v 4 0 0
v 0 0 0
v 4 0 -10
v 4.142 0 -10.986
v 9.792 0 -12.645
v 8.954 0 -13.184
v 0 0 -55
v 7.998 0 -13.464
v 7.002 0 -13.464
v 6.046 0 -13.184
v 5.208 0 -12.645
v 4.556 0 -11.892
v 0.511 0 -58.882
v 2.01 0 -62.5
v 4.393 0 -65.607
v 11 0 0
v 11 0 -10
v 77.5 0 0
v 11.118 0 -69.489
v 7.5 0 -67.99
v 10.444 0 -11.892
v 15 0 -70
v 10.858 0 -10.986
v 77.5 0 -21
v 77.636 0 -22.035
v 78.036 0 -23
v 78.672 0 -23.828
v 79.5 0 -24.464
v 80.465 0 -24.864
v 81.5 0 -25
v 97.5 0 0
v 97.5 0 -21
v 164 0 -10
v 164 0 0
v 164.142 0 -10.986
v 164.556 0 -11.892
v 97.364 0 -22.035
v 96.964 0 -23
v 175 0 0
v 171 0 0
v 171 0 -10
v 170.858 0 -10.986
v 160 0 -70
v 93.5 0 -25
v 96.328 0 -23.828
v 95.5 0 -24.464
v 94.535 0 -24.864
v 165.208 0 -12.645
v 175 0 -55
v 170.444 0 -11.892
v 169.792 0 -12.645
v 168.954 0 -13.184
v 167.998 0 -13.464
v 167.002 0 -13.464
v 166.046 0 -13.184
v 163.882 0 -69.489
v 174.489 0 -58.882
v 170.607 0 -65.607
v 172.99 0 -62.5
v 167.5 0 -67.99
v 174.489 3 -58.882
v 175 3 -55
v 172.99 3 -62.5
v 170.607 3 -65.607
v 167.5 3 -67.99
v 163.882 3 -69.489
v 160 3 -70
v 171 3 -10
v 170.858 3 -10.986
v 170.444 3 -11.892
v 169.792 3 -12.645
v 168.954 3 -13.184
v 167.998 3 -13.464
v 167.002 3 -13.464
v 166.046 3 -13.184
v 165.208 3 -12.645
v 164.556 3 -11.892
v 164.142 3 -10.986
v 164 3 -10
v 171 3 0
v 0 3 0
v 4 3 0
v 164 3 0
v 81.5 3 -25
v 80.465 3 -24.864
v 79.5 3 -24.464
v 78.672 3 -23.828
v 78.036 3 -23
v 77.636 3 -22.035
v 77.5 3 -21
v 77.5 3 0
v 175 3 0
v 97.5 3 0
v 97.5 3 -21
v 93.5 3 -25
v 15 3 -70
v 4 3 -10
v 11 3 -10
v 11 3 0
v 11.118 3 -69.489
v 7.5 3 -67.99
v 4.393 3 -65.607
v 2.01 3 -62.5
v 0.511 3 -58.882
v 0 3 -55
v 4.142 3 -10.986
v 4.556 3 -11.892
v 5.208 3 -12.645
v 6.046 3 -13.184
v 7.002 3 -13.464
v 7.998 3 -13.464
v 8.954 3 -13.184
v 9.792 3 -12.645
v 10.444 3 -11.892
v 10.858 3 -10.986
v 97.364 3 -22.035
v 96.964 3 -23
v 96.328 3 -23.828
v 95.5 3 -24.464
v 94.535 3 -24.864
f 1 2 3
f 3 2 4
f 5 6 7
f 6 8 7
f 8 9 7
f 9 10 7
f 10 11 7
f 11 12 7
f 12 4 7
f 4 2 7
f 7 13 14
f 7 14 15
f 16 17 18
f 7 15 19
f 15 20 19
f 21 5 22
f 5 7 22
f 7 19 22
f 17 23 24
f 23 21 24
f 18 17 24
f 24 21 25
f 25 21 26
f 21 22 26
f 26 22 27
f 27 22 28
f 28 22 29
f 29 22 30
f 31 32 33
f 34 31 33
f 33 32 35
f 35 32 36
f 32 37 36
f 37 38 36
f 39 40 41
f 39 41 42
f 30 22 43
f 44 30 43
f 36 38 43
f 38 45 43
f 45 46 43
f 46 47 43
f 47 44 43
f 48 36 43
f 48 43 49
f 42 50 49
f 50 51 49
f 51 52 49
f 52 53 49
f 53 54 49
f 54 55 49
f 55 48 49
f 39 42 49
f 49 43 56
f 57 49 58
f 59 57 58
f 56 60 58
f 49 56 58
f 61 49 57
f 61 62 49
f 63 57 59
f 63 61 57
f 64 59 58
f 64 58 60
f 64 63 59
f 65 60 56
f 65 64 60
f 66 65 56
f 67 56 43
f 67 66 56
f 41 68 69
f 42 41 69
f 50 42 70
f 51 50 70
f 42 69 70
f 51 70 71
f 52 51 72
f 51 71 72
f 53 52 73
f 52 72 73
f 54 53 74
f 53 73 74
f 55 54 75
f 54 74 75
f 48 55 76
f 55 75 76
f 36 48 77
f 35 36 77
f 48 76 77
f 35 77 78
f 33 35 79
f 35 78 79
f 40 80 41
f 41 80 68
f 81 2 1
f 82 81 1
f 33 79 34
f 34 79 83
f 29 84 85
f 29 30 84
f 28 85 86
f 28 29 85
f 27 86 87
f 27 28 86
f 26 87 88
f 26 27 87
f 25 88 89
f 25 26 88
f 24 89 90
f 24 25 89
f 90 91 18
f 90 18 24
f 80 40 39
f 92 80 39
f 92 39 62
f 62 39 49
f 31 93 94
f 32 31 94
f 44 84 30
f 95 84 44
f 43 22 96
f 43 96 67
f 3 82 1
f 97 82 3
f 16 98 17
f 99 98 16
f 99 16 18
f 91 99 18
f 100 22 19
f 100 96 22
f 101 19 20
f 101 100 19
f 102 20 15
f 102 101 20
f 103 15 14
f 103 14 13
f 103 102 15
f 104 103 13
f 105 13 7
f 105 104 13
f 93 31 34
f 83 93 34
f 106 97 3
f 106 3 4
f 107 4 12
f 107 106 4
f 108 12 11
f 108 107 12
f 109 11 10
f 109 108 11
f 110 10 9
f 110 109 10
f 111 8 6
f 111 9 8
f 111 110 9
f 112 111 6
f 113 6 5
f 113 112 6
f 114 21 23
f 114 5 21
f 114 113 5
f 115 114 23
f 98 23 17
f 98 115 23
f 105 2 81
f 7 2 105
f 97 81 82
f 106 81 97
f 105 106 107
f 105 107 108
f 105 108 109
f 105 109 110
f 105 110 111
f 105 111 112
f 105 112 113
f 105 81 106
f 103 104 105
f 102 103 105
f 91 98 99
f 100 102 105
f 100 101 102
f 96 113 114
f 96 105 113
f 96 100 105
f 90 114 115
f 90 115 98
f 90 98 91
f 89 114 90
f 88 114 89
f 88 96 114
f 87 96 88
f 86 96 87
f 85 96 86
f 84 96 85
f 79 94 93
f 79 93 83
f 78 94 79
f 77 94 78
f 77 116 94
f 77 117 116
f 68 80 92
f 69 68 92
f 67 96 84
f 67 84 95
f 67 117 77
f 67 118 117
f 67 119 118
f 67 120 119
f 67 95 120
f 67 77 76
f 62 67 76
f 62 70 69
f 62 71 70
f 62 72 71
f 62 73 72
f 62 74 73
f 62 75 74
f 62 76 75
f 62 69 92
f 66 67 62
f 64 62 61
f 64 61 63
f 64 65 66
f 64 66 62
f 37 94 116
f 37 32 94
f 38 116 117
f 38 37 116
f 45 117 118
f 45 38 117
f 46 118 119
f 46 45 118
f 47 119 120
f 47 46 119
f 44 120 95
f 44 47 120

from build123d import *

# Parameters (mm, degrees)
SKETCH1_W           = 175
SKETCH1_H           = 70
BOSS_EXTRUDE1_DEPTH = 3
SKETCH2_W           = 20
SKETCH2_H           = 25
CUT_EXTRUDE1_DEPTH  = 5
FILLET1_R           = 4
FILLET2_R           = 15


with BuildPart() as part:
    # Sketch1 → Boss-Extrude1 (new body)
    with BuildSketch(Plane(origin=(0, 0, 0), x_dir=(1, 0, 0), z_dir=(0, 1, 0))):
        with Locations((87.5, 35)):
            Rectangle(SKETCH1_W, SKETCH1_H)
    extrude(amount=BOSS_EXTRUDE1_DEPTH)

    # Sketch2 → Cut-Extrude1 (cut)
    with BuildSketch(Plane(origin=(0, 3, 0), x_dir=(1, 0, 0), z_dir=(0, 1, 0))):
        with Locations((87.5, 12.5)):
            Rectangle(SKETCH2_W, SKETCH2_H)
        with BuildLine():
            Line((11, 10), (11, 0))
            Line((11, 0), (4, 0))
            Line((4, 0), (4, 10))
            ThreePointArc((4, 10), (7.5, 13.5), (11, 10))
        make_face()
        with BuildLine():
            Line((171, 0), (171, 10))
            ThreePointArc((171, 10), (167.5, 13.5), (164, 10))
            Line((164, 10), (164, 0))
            Line((164, 0), (171, 0))
        make_face()
    extrude(amount=-CUT_EXTRUDE1_DEPTH, mode=Mode.SUBTRACT)

    # Fillet1
    fillet1_edges = [part.edges().sort_by_distance(p)[0] for p in [
        (77.5, 1.5, -25),
        (97.5, 1.5, -25),
    ]]
    fillet(fillet1_edges, radius=FILLET1_R)

    # Fillet2
    fillet2_edges = [part.edges().sort_by_distance(p)[0] for p in [
        (0, 1.5, -70),
        (175, 1.5, -70),
    ]]
    fillet(fillet2_edges, radius=FILLET2_R)


solid = part.part
